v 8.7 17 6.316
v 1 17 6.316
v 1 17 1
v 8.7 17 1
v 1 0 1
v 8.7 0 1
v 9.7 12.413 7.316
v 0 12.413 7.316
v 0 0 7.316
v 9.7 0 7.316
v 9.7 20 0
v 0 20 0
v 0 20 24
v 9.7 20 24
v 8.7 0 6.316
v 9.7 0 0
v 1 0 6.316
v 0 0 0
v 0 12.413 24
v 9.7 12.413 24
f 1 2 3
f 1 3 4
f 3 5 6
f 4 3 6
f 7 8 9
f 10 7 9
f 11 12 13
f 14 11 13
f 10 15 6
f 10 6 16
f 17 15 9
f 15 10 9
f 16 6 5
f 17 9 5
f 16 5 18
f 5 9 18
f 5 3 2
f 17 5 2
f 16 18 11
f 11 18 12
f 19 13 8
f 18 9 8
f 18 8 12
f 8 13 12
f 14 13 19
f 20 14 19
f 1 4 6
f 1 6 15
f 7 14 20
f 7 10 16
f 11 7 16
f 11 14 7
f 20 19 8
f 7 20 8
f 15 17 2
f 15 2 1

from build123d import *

# Parameters (mm, degrees)
EXTRUDE_1_DEPTH     = 9.7
SKETCH_2_W          = 7.7
SKETCH_2_H          = 5.316419403
CUT_EXTRUDE_1_DEPTH = 17


with BuildPart() as part:
    # 草圖1 → 填料-伸長1 (new body)
    with BuildSketch(Plane(origin=(0, 0, 0), x_dir=(0, 0, -1), z_dir=(1, 0, 0))):
        Polygon((0, 0), (0, 20), (-24, 20), (-24, 12.4126021), (-7.316419403, 12.4126021), (-7.316419403, 0), align=None)
    extrude(amount=EXTRUDE_1_DEPTH)

    # 草圖2 → 除料-伸長1 (cut)
    with BuildSketch(Plane.XZ):
        with Locations((4.85, 3.658209702)):
            Rectangle(SKETCH_2_W, SKETCH_2_H)
    extrude(amount=-CUT_EXTRUDE_1_DEPTH, mode=Mode.SUBTRACT)


solid = part.part
